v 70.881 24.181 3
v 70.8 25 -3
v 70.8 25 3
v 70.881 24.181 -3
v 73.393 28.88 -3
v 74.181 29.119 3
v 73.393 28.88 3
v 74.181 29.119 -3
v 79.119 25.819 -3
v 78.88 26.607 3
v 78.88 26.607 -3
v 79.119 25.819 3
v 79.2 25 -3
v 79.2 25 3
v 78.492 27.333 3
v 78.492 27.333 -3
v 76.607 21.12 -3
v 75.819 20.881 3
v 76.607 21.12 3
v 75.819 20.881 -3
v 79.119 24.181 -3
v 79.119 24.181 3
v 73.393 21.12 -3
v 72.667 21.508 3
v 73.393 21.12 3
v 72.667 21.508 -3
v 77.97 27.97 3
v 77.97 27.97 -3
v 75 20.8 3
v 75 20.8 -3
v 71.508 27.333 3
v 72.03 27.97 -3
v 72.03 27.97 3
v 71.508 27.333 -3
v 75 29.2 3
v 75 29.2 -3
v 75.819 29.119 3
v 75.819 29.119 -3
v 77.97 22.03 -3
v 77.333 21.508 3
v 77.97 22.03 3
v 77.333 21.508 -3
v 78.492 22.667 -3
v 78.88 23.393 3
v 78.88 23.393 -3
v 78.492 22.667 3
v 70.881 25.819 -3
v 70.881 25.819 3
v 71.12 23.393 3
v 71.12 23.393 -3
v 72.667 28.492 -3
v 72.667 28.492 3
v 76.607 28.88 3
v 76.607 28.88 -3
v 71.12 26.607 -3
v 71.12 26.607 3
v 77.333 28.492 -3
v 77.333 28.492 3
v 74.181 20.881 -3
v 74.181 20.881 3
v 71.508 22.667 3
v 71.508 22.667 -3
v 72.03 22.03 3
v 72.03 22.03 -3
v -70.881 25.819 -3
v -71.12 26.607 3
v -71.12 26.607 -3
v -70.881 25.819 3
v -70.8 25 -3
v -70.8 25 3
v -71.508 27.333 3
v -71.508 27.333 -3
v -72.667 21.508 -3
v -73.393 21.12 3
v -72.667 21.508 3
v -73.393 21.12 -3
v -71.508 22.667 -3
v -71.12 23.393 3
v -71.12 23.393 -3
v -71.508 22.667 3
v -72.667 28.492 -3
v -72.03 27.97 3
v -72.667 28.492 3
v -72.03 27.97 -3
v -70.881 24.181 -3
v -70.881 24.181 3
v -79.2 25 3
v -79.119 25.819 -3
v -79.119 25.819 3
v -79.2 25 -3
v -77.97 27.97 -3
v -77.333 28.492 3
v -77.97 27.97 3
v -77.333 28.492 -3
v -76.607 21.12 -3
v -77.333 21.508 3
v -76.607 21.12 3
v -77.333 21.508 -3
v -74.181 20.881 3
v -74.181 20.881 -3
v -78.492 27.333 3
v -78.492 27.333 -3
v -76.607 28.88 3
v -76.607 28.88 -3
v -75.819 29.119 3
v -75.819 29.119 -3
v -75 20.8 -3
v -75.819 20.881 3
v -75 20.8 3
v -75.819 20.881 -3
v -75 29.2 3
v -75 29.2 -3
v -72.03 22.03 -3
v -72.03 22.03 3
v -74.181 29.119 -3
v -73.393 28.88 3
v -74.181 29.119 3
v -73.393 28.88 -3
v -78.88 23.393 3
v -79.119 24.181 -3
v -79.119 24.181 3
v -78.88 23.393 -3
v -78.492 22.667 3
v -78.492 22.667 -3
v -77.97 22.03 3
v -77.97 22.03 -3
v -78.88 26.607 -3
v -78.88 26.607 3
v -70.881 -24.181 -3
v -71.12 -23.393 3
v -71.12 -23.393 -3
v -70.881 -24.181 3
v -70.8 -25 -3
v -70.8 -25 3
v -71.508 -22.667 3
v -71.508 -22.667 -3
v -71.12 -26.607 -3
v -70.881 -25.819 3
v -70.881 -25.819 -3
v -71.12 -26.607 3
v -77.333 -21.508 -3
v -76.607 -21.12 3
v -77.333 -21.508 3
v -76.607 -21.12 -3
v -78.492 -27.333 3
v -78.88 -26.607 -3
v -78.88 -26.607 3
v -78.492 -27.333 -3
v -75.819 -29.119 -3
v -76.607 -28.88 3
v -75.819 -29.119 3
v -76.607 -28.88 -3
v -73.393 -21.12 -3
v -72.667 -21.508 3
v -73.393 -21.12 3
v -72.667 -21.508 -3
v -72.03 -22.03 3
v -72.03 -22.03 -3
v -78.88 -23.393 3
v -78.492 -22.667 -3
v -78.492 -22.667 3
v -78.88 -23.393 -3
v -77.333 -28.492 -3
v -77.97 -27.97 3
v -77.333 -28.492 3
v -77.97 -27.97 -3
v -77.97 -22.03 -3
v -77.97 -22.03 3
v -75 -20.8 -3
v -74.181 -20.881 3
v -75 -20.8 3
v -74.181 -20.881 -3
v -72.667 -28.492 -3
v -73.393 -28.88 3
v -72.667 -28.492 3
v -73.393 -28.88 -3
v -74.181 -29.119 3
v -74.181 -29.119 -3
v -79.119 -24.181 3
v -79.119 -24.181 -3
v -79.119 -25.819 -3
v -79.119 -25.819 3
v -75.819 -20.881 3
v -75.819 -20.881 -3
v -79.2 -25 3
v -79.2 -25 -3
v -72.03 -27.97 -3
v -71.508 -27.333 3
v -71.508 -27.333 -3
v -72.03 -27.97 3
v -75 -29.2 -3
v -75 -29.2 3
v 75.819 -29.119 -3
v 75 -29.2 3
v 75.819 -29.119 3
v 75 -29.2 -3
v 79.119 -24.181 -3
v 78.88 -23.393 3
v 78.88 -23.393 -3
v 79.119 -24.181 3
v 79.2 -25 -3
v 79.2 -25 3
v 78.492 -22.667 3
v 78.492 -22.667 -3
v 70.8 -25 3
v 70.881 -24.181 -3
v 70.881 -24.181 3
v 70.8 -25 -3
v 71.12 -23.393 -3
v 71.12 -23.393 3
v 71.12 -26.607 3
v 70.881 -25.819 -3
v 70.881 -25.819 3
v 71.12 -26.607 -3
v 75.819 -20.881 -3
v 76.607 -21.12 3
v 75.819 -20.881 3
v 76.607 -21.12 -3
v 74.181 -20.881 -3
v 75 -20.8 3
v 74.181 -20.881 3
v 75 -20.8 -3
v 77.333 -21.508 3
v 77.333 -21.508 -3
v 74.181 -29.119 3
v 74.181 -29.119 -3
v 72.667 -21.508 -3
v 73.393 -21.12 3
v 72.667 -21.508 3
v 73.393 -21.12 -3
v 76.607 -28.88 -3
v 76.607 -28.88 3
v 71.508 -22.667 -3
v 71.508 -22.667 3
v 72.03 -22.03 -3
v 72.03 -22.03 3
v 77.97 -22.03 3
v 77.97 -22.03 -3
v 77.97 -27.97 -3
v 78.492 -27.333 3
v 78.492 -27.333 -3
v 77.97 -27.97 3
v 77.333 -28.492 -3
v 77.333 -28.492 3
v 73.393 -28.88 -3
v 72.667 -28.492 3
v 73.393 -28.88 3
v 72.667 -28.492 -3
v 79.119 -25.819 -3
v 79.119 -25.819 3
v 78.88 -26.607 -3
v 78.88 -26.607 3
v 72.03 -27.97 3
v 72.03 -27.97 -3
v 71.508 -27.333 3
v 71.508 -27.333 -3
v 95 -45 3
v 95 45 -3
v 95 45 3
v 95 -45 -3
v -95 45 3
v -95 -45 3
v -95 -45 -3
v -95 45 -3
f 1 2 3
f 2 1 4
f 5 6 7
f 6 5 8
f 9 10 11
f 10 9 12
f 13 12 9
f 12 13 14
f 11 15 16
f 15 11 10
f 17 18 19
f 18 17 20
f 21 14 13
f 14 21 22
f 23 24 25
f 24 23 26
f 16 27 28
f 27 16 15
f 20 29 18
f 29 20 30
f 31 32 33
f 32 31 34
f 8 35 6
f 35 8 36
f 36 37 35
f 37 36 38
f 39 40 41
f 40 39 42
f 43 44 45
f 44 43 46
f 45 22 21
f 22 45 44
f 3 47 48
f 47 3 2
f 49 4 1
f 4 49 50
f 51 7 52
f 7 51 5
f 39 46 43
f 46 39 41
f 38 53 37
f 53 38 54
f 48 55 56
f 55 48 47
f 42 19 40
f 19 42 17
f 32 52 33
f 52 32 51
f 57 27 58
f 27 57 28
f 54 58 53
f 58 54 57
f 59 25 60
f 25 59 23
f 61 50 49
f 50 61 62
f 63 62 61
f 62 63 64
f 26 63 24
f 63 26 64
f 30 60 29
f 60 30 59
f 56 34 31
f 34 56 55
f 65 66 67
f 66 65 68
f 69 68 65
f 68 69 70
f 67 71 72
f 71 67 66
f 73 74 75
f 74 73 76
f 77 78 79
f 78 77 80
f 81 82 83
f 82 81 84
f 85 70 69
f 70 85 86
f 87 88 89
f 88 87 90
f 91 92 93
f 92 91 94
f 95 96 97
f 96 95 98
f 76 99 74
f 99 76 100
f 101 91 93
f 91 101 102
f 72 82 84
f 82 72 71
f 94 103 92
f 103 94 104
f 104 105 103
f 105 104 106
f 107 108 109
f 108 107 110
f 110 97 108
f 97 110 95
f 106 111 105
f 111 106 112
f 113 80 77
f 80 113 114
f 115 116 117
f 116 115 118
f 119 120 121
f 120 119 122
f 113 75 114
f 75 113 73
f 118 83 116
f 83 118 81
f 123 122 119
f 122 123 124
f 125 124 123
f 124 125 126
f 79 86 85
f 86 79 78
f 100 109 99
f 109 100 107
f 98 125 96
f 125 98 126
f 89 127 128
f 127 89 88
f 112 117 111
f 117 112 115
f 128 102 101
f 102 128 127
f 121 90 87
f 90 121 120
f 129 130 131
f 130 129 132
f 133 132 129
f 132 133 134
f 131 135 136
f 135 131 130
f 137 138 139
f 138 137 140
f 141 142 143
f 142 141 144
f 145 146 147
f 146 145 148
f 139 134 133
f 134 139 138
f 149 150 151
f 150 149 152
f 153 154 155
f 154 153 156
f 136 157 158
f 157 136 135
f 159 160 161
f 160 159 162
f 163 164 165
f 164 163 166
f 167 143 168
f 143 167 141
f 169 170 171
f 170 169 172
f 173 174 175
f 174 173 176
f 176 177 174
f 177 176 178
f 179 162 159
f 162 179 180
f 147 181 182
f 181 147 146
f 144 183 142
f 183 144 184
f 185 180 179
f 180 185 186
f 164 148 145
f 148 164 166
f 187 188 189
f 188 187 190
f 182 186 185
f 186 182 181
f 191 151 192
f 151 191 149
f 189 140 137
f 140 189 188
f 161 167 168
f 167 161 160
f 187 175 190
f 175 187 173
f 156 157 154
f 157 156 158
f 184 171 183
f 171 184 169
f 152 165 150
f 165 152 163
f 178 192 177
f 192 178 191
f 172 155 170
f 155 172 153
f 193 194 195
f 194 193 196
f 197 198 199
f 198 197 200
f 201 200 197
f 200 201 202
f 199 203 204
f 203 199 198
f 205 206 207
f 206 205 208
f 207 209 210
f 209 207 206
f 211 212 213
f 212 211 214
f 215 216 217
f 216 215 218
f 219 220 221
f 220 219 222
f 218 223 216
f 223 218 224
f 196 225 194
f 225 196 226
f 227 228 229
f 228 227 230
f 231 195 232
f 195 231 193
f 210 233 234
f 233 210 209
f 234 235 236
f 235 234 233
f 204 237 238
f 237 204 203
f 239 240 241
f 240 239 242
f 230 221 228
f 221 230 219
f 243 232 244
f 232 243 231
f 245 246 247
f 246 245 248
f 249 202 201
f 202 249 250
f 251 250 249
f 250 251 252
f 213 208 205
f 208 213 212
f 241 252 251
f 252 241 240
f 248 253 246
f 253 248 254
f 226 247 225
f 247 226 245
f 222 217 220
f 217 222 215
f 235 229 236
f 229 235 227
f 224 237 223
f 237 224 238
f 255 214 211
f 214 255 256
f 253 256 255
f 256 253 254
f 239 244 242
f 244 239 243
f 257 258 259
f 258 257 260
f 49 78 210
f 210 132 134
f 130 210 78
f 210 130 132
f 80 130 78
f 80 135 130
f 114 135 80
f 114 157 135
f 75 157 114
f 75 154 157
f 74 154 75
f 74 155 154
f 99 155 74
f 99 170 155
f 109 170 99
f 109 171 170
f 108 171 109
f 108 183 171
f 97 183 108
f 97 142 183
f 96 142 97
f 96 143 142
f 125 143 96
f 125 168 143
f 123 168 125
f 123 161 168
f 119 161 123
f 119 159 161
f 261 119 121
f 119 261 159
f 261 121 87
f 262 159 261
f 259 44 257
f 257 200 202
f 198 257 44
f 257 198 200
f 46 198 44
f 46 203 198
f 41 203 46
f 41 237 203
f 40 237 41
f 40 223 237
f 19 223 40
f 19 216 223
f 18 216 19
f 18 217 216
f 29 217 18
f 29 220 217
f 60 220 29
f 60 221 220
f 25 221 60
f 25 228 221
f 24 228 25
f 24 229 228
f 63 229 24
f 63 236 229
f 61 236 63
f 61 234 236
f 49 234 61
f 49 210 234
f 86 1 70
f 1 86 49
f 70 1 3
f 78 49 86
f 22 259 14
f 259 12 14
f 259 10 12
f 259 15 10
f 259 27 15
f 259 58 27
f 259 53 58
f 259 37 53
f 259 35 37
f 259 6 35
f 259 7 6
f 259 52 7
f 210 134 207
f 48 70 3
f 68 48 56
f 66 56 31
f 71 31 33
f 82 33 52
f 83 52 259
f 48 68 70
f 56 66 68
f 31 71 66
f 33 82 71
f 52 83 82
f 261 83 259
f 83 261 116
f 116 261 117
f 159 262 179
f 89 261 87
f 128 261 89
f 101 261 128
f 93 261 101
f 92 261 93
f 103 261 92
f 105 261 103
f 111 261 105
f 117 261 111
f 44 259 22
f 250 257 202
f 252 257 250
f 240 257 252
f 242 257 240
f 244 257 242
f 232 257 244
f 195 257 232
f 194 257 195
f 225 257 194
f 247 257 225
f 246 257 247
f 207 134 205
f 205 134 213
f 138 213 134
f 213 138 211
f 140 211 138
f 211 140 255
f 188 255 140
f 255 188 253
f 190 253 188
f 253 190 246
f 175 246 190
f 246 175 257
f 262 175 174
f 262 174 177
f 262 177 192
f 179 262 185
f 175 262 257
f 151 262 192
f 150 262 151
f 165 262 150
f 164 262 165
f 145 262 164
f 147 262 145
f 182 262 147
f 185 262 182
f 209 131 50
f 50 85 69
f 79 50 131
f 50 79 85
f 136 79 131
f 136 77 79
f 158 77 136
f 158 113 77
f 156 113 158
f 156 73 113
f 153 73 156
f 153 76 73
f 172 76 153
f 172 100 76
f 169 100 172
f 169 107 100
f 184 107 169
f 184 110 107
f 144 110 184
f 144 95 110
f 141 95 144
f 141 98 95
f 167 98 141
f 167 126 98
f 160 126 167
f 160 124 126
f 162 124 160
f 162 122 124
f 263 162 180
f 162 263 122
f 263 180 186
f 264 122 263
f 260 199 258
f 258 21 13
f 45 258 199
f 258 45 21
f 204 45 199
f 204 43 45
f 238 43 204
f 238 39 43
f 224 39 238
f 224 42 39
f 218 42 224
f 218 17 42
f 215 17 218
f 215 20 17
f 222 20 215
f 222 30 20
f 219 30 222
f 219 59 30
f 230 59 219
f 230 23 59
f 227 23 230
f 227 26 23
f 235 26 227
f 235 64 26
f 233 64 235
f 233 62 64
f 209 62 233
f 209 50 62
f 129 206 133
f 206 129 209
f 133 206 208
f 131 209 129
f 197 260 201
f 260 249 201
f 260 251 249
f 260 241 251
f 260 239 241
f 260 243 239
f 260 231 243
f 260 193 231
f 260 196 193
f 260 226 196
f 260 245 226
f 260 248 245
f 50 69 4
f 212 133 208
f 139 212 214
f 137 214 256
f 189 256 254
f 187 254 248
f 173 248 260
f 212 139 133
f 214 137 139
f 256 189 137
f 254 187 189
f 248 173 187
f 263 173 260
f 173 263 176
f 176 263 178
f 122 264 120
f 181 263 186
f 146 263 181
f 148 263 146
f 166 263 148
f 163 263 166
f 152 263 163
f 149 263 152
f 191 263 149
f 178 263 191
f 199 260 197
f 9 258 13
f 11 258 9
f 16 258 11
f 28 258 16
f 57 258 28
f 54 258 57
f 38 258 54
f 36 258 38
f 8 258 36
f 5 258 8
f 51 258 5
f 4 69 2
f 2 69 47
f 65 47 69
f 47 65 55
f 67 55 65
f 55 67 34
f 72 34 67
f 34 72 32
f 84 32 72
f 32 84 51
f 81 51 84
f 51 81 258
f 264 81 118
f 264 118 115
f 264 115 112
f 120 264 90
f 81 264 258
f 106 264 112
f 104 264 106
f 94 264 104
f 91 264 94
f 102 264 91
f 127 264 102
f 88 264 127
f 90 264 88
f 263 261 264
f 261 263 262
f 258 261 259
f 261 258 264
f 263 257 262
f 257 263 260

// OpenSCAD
$fn = 32;

// ----------------------------------------------------------------------
// Corner plate 190 x 90 x 6
// 4 holes, centres taken from the edge offset
// ----------------------------------------------------------------------

// --- parameters (mm) ---
plate = [190, 90, 6];  // overall size (x, y, z)
holes = 4;             // number of holes the drawing asks for
hole_d = 8.4;          // hole diameter
edge = 20;             // hole centre offset from the plate edge

// --- derived feature positions (mm) ---
corner_x = plate[0] / 2 - edge;  // = 75   corner hole X
corner_y = plate[1] / 2 - edge;  // = 25   corner hole Y
feature_centers = [
  [corner_x, corner_y],
  [-corner_x, corner_y],
  [-corner_x, -corner_y],
  [corner_x, -corner_y]
];   // hole centres the loop below drills

// plate outline, every hole drilled through with the same cutters
difference() {
  cube(plate, center = true);
  for (centre = feature_centers)
    translate([centre[0], centre[1], 0])
      cylinder(d = hole_d, h = plate[2] + 2, center = true);
}
